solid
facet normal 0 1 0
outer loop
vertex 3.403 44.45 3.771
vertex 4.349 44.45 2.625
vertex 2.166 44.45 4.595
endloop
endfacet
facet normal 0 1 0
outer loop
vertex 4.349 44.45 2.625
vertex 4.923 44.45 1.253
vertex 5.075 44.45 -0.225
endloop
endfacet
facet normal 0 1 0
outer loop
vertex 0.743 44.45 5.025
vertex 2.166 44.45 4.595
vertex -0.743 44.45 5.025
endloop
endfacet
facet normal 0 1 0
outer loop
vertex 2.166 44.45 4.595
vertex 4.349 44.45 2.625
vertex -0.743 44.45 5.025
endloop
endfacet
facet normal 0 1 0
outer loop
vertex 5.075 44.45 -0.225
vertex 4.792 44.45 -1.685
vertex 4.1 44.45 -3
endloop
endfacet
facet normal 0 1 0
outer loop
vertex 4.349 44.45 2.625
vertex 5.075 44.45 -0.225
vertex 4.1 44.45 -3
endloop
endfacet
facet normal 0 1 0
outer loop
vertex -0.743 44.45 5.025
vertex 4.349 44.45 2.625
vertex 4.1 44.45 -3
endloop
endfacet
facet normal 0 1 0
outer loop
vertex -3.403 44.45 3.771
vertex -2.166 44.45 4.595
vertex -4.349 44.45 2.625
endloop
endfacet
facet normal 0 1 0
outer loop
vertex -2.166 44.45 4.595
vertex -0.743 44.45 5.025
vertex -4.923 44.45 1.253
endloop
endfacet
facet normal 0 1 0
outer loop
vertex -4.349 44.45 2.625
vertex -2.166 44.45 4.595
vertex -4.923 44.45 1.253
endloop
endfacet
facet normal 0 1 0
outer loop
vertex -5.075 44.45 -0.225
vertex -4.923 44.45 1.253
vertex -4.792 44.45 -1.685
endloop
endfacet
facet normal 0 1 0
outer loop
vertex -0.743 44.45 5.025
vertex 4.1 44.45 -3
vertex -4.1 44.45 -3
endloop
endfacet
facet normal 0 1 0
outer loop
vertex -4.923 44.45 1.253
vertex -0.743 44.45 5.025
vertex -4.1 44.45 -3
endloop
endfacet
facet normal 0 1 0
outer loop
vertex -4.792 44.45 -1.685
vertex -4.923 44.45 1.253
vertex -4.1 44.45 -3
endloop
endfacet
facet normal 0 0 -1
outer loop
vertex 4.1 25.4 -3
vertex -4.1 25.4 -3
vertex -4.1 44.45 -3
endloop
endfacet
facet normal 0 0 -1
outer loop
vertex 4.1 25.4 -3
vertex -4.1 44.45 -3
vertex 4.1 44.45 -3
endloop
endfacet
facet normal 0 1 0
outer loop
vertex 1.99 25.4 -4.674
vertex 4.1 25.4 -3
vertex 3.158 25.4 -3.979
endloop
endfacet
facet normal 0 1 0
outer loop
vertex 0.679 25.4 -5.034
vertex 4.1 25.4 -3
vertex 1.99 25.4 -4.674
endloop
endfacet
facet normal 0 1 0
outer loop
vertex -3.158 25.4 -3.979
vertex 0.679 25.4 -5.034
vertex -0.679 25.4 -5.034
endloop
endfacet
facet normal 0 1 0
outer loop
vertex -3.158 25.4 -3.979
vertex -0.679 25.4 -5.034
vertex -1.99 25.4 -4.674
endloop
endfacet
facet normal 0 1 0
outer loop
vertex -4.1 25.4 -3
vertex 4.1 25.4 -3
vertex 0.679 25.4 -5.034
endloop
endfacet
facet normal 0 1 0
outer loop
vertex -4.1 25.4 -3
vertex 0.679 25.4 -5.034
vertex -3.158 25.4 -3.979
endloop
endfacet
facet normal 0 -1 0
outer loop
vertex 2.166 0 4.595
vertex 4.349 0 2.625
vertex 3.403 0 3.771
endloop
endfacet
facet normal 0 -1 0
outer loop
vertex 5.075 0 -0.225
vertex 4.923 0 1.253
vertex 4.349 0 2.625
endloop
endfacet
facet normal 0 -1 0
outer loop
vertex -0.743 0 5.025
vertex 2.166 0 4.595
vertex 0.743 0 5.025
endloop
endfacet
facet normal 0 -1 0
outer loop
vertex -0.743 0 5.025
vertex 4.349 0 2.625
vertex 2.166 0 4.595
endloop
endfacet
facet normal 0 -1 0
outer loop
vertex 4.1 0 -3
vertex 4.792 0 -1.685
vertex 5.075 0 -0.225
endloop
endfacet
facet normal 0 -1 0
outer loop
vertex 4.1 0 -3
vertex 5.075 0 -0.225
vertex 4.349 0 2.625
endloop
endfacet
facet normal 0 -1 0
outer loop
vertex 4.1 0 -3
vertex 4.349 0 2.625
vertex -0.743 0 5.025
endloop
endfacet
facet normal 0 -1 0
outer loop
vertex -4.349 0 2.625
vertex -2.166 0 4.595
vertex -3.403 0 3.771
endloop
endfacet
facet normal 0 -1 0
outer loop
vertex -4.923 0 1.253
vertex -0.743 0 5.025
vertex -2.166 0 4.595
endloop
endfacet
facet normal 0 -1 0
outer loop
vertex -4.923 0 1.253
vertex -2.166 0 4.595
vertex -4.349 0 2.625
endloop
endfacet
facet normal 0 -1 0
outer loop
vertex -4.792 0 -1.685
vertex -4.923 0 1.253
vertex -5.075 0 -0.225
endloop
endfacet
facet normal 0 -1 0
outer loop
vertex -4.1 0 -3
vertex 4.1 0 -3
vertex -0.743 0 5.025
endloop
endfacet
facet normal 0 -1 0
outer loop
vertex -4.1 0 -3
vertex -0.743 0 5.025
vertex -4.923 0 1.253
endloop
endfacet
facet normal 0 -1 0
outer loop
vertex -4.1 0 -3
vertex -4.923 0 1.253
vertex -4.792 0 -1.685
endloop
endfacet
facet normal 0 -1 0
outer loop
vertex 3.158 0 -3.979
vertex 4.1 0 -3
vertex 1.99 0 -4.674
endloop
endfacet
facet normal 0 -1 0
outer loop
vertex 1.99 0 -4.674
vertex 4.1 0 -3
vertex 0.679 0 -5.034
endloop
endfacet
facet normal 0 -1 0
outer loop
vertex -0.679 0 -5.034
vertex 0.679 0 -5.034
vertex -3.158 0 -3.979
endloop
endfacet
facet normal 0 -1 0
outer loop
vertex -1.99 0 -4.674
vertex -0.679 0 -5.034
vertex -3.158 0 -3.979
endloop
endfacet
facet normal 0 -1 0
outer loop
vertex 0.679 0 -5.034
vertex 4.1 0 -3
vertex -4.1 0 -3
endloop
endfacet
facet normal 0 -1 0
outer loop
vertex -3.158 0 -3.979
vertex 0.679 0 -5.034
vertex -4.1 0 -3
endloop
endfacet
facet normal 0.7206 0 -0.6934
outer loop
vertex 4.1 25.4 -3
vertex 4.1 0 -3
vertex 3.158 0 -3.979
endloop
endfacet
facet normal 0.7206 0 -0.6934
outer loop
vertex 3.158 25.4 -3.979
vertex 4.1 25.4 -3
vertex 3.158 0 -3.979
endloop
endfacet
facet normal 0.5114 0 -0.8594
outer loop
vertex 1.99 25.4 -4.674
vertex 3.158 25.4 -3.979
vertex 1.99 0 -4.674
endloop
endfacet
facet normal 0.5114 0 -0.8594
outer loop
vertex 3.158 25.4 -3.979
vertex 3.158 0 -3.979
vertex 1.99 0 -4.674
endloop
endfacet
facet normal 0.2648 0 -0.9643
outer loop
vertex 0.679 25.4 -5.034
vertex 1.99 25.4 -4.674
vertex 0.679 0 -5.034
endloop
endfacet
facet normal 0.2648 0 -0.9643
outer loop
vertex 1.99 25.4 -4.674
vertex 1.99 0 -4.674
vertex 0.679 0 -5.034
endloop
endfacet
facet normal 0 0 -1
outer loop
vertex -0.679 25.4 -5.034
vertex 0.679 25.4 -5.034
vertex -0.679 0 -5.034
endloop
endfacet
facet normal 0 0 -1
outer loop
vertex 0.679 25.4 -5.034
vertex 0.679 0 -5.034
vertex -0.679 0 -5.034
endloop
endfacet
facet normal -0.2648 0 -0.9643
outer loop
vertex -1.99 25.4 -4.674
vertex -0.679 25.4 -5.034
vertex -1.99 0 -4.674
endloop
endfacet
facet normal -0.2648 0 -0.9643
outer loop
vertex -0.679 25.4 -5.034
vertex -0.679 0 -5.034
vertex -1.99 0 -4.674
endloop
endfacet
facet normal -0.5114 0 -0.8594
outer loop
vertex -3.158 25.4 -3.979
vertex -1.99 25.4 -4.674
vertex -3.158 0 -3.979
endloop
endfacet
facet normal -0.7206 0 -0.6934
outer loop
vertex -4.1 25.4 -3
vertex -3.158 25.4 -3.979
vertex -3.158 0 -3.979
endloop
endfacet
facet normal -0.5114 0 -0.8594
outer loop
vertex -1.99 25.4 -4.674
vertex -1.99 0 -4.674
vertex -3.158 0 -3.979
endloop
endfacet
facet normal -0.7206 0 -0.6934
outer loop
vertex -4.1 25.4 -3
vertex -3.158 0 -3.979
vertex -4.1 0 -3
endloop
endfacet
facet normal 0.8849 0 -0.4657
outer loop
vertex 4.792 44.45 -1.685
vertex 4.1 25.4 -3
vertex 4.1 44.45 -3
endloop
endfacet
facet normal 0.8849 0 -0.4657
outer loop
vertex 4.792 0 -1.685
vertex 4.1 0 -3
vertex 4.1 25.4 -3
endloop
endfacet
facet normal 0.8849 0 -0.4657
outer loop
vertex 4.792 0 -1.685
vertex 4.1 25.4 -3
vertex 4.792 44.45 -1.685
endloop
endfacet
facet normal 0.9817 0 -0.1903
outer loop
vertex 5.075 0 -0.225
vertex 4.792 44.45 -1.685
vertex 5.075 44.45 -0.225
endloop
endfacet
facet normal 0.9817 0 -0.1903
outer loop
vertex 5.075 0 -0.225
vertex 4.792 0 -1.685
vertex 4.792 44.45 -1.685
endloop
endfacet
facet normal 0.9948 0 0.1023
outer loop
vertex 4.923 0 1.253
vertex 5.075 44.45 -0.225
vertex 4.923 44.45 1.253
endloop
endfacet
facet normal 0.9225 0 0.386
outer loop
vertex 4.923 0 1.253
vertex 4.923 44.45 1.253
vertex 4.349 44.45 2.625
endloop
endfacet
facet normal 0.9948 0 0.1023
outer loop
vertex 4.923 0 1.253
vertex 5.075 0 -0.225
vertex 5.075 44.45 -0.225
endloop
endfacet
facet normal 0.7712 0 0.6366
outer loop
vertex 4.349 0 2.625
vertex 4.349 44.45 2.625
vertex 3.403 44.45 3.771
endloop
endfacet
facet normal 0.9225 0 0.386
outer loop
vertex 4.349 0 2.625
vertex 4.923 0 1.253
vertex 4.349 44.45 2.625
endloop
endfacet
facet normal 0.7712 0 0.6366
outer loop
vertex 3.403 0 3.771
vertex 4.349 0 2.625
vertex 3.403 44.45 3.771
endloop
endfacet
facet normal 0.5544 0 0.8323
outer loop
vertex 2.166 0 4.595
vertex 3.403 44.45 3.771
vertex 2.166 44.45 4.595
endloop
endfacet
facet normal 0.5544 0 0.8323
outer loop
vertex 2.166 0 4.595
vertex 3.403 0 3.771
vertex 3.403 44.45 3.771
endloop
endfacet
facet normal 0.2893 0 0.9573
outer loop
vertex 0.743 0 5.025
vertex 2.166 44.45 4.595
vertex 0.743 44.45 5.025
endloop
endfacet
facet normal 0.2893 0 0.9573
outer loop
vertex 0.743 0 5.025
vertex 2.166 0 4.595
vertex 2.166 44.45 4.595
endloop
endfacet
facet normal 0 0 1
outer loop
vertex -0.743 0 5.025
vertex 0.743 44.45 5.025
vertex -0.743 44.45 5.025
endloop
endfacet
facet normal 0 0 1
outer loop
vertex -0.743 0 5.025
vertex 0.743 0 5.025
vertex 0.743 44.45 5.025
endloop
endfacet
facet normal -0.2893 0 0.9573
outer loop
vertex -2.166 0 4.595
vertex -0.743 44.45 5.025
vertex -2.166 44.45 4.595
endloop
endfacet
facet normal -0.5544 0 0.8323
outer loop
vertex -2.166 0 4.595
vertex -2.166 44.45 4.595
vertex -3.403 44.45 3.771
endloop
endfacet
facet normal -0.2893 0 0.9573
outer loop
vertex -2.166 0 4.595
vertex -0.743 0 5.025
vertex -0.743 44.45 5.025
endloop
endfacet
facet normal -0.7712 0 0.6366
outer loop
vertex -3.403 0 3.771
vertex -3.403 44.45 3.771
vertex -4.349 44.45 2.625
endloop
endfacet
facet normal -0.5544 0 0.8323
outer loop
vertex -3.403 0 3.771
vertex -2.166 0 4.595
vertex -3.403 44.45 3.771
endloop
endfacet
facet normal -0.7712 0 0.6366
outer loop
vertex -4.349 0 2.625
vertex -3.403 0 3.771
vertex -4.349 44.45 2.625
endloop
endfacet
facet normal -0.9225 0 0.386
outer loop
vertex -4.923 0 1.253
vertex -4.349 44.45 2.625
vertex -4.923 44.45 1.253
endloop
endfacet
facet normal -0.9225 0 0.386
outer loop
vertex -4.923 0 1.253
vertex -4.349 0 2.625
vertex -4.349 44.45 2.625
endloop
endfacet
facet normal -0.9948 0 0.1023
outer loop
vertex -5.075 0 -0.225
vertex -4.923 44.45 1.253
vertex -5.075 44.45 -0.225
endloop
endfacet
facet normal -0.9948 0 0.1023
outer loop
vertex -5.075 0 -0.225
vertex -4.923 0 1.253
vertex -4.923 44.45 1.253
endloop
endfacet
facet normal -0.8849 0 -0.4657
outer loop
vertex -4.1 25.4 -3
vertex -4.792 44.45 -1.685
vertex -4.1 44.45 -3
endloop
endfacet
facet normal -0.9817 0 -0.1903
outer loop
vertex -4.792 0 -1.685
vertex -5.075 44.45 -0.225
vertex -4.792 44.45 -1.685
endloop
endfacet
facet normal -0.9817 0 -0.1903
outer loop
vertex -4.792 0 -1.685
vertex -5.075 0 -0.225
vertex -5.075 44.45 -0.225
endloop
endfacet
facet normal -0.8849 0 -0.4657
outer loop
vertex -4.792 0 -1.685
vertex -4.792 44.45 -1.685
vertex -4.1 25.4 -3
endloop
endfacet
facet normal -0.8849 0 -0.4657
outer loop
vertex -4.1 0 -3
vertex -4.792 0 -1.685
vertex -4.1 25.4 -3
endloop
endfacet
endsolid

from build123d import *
from build123d.topology import SkipClean

# Parameters (mm, degrees)
BOSS_EXTRUDE1_DEPTH = 44.45
BOSS_EXTRUDE2_DEPTH = 25.4


with BuildPart() as part:
    # Sketch1 → Boss-Extrude1 (new body)
    with BuildSketch(Plane(origin=(0, 0, 0), x_dir=(1, 0, 0), z_dir=(0, 1, 0))):
        with BuildLine():
            Line((-4.099560952, 3), (4.099560952, 3))
            ThreePointArc((4.099560952, 3), (0, -5.08), (-4.099560952, 3))
        make_face()
    extrude(amount=BOSS_EXTRUDE1_DEPTH)

    # Sketch3 → Boss-Extrude2 (add)
    with SkipClean():  # the faces are left unmerged after this step: merging them gives an invalid solid
        with BuildSketch(Plane.XZ):
            with BuildLine():
                Line((-4.099560952, -3), (4.099560952, -3))
                ThreePointArc((4.099560952, -3), (0, -5.08), (-4.099560952, -3))
            make_face()
        extrude(amount=-BOSS_EXTRUDE2_DEPTH)


solid = part.part
